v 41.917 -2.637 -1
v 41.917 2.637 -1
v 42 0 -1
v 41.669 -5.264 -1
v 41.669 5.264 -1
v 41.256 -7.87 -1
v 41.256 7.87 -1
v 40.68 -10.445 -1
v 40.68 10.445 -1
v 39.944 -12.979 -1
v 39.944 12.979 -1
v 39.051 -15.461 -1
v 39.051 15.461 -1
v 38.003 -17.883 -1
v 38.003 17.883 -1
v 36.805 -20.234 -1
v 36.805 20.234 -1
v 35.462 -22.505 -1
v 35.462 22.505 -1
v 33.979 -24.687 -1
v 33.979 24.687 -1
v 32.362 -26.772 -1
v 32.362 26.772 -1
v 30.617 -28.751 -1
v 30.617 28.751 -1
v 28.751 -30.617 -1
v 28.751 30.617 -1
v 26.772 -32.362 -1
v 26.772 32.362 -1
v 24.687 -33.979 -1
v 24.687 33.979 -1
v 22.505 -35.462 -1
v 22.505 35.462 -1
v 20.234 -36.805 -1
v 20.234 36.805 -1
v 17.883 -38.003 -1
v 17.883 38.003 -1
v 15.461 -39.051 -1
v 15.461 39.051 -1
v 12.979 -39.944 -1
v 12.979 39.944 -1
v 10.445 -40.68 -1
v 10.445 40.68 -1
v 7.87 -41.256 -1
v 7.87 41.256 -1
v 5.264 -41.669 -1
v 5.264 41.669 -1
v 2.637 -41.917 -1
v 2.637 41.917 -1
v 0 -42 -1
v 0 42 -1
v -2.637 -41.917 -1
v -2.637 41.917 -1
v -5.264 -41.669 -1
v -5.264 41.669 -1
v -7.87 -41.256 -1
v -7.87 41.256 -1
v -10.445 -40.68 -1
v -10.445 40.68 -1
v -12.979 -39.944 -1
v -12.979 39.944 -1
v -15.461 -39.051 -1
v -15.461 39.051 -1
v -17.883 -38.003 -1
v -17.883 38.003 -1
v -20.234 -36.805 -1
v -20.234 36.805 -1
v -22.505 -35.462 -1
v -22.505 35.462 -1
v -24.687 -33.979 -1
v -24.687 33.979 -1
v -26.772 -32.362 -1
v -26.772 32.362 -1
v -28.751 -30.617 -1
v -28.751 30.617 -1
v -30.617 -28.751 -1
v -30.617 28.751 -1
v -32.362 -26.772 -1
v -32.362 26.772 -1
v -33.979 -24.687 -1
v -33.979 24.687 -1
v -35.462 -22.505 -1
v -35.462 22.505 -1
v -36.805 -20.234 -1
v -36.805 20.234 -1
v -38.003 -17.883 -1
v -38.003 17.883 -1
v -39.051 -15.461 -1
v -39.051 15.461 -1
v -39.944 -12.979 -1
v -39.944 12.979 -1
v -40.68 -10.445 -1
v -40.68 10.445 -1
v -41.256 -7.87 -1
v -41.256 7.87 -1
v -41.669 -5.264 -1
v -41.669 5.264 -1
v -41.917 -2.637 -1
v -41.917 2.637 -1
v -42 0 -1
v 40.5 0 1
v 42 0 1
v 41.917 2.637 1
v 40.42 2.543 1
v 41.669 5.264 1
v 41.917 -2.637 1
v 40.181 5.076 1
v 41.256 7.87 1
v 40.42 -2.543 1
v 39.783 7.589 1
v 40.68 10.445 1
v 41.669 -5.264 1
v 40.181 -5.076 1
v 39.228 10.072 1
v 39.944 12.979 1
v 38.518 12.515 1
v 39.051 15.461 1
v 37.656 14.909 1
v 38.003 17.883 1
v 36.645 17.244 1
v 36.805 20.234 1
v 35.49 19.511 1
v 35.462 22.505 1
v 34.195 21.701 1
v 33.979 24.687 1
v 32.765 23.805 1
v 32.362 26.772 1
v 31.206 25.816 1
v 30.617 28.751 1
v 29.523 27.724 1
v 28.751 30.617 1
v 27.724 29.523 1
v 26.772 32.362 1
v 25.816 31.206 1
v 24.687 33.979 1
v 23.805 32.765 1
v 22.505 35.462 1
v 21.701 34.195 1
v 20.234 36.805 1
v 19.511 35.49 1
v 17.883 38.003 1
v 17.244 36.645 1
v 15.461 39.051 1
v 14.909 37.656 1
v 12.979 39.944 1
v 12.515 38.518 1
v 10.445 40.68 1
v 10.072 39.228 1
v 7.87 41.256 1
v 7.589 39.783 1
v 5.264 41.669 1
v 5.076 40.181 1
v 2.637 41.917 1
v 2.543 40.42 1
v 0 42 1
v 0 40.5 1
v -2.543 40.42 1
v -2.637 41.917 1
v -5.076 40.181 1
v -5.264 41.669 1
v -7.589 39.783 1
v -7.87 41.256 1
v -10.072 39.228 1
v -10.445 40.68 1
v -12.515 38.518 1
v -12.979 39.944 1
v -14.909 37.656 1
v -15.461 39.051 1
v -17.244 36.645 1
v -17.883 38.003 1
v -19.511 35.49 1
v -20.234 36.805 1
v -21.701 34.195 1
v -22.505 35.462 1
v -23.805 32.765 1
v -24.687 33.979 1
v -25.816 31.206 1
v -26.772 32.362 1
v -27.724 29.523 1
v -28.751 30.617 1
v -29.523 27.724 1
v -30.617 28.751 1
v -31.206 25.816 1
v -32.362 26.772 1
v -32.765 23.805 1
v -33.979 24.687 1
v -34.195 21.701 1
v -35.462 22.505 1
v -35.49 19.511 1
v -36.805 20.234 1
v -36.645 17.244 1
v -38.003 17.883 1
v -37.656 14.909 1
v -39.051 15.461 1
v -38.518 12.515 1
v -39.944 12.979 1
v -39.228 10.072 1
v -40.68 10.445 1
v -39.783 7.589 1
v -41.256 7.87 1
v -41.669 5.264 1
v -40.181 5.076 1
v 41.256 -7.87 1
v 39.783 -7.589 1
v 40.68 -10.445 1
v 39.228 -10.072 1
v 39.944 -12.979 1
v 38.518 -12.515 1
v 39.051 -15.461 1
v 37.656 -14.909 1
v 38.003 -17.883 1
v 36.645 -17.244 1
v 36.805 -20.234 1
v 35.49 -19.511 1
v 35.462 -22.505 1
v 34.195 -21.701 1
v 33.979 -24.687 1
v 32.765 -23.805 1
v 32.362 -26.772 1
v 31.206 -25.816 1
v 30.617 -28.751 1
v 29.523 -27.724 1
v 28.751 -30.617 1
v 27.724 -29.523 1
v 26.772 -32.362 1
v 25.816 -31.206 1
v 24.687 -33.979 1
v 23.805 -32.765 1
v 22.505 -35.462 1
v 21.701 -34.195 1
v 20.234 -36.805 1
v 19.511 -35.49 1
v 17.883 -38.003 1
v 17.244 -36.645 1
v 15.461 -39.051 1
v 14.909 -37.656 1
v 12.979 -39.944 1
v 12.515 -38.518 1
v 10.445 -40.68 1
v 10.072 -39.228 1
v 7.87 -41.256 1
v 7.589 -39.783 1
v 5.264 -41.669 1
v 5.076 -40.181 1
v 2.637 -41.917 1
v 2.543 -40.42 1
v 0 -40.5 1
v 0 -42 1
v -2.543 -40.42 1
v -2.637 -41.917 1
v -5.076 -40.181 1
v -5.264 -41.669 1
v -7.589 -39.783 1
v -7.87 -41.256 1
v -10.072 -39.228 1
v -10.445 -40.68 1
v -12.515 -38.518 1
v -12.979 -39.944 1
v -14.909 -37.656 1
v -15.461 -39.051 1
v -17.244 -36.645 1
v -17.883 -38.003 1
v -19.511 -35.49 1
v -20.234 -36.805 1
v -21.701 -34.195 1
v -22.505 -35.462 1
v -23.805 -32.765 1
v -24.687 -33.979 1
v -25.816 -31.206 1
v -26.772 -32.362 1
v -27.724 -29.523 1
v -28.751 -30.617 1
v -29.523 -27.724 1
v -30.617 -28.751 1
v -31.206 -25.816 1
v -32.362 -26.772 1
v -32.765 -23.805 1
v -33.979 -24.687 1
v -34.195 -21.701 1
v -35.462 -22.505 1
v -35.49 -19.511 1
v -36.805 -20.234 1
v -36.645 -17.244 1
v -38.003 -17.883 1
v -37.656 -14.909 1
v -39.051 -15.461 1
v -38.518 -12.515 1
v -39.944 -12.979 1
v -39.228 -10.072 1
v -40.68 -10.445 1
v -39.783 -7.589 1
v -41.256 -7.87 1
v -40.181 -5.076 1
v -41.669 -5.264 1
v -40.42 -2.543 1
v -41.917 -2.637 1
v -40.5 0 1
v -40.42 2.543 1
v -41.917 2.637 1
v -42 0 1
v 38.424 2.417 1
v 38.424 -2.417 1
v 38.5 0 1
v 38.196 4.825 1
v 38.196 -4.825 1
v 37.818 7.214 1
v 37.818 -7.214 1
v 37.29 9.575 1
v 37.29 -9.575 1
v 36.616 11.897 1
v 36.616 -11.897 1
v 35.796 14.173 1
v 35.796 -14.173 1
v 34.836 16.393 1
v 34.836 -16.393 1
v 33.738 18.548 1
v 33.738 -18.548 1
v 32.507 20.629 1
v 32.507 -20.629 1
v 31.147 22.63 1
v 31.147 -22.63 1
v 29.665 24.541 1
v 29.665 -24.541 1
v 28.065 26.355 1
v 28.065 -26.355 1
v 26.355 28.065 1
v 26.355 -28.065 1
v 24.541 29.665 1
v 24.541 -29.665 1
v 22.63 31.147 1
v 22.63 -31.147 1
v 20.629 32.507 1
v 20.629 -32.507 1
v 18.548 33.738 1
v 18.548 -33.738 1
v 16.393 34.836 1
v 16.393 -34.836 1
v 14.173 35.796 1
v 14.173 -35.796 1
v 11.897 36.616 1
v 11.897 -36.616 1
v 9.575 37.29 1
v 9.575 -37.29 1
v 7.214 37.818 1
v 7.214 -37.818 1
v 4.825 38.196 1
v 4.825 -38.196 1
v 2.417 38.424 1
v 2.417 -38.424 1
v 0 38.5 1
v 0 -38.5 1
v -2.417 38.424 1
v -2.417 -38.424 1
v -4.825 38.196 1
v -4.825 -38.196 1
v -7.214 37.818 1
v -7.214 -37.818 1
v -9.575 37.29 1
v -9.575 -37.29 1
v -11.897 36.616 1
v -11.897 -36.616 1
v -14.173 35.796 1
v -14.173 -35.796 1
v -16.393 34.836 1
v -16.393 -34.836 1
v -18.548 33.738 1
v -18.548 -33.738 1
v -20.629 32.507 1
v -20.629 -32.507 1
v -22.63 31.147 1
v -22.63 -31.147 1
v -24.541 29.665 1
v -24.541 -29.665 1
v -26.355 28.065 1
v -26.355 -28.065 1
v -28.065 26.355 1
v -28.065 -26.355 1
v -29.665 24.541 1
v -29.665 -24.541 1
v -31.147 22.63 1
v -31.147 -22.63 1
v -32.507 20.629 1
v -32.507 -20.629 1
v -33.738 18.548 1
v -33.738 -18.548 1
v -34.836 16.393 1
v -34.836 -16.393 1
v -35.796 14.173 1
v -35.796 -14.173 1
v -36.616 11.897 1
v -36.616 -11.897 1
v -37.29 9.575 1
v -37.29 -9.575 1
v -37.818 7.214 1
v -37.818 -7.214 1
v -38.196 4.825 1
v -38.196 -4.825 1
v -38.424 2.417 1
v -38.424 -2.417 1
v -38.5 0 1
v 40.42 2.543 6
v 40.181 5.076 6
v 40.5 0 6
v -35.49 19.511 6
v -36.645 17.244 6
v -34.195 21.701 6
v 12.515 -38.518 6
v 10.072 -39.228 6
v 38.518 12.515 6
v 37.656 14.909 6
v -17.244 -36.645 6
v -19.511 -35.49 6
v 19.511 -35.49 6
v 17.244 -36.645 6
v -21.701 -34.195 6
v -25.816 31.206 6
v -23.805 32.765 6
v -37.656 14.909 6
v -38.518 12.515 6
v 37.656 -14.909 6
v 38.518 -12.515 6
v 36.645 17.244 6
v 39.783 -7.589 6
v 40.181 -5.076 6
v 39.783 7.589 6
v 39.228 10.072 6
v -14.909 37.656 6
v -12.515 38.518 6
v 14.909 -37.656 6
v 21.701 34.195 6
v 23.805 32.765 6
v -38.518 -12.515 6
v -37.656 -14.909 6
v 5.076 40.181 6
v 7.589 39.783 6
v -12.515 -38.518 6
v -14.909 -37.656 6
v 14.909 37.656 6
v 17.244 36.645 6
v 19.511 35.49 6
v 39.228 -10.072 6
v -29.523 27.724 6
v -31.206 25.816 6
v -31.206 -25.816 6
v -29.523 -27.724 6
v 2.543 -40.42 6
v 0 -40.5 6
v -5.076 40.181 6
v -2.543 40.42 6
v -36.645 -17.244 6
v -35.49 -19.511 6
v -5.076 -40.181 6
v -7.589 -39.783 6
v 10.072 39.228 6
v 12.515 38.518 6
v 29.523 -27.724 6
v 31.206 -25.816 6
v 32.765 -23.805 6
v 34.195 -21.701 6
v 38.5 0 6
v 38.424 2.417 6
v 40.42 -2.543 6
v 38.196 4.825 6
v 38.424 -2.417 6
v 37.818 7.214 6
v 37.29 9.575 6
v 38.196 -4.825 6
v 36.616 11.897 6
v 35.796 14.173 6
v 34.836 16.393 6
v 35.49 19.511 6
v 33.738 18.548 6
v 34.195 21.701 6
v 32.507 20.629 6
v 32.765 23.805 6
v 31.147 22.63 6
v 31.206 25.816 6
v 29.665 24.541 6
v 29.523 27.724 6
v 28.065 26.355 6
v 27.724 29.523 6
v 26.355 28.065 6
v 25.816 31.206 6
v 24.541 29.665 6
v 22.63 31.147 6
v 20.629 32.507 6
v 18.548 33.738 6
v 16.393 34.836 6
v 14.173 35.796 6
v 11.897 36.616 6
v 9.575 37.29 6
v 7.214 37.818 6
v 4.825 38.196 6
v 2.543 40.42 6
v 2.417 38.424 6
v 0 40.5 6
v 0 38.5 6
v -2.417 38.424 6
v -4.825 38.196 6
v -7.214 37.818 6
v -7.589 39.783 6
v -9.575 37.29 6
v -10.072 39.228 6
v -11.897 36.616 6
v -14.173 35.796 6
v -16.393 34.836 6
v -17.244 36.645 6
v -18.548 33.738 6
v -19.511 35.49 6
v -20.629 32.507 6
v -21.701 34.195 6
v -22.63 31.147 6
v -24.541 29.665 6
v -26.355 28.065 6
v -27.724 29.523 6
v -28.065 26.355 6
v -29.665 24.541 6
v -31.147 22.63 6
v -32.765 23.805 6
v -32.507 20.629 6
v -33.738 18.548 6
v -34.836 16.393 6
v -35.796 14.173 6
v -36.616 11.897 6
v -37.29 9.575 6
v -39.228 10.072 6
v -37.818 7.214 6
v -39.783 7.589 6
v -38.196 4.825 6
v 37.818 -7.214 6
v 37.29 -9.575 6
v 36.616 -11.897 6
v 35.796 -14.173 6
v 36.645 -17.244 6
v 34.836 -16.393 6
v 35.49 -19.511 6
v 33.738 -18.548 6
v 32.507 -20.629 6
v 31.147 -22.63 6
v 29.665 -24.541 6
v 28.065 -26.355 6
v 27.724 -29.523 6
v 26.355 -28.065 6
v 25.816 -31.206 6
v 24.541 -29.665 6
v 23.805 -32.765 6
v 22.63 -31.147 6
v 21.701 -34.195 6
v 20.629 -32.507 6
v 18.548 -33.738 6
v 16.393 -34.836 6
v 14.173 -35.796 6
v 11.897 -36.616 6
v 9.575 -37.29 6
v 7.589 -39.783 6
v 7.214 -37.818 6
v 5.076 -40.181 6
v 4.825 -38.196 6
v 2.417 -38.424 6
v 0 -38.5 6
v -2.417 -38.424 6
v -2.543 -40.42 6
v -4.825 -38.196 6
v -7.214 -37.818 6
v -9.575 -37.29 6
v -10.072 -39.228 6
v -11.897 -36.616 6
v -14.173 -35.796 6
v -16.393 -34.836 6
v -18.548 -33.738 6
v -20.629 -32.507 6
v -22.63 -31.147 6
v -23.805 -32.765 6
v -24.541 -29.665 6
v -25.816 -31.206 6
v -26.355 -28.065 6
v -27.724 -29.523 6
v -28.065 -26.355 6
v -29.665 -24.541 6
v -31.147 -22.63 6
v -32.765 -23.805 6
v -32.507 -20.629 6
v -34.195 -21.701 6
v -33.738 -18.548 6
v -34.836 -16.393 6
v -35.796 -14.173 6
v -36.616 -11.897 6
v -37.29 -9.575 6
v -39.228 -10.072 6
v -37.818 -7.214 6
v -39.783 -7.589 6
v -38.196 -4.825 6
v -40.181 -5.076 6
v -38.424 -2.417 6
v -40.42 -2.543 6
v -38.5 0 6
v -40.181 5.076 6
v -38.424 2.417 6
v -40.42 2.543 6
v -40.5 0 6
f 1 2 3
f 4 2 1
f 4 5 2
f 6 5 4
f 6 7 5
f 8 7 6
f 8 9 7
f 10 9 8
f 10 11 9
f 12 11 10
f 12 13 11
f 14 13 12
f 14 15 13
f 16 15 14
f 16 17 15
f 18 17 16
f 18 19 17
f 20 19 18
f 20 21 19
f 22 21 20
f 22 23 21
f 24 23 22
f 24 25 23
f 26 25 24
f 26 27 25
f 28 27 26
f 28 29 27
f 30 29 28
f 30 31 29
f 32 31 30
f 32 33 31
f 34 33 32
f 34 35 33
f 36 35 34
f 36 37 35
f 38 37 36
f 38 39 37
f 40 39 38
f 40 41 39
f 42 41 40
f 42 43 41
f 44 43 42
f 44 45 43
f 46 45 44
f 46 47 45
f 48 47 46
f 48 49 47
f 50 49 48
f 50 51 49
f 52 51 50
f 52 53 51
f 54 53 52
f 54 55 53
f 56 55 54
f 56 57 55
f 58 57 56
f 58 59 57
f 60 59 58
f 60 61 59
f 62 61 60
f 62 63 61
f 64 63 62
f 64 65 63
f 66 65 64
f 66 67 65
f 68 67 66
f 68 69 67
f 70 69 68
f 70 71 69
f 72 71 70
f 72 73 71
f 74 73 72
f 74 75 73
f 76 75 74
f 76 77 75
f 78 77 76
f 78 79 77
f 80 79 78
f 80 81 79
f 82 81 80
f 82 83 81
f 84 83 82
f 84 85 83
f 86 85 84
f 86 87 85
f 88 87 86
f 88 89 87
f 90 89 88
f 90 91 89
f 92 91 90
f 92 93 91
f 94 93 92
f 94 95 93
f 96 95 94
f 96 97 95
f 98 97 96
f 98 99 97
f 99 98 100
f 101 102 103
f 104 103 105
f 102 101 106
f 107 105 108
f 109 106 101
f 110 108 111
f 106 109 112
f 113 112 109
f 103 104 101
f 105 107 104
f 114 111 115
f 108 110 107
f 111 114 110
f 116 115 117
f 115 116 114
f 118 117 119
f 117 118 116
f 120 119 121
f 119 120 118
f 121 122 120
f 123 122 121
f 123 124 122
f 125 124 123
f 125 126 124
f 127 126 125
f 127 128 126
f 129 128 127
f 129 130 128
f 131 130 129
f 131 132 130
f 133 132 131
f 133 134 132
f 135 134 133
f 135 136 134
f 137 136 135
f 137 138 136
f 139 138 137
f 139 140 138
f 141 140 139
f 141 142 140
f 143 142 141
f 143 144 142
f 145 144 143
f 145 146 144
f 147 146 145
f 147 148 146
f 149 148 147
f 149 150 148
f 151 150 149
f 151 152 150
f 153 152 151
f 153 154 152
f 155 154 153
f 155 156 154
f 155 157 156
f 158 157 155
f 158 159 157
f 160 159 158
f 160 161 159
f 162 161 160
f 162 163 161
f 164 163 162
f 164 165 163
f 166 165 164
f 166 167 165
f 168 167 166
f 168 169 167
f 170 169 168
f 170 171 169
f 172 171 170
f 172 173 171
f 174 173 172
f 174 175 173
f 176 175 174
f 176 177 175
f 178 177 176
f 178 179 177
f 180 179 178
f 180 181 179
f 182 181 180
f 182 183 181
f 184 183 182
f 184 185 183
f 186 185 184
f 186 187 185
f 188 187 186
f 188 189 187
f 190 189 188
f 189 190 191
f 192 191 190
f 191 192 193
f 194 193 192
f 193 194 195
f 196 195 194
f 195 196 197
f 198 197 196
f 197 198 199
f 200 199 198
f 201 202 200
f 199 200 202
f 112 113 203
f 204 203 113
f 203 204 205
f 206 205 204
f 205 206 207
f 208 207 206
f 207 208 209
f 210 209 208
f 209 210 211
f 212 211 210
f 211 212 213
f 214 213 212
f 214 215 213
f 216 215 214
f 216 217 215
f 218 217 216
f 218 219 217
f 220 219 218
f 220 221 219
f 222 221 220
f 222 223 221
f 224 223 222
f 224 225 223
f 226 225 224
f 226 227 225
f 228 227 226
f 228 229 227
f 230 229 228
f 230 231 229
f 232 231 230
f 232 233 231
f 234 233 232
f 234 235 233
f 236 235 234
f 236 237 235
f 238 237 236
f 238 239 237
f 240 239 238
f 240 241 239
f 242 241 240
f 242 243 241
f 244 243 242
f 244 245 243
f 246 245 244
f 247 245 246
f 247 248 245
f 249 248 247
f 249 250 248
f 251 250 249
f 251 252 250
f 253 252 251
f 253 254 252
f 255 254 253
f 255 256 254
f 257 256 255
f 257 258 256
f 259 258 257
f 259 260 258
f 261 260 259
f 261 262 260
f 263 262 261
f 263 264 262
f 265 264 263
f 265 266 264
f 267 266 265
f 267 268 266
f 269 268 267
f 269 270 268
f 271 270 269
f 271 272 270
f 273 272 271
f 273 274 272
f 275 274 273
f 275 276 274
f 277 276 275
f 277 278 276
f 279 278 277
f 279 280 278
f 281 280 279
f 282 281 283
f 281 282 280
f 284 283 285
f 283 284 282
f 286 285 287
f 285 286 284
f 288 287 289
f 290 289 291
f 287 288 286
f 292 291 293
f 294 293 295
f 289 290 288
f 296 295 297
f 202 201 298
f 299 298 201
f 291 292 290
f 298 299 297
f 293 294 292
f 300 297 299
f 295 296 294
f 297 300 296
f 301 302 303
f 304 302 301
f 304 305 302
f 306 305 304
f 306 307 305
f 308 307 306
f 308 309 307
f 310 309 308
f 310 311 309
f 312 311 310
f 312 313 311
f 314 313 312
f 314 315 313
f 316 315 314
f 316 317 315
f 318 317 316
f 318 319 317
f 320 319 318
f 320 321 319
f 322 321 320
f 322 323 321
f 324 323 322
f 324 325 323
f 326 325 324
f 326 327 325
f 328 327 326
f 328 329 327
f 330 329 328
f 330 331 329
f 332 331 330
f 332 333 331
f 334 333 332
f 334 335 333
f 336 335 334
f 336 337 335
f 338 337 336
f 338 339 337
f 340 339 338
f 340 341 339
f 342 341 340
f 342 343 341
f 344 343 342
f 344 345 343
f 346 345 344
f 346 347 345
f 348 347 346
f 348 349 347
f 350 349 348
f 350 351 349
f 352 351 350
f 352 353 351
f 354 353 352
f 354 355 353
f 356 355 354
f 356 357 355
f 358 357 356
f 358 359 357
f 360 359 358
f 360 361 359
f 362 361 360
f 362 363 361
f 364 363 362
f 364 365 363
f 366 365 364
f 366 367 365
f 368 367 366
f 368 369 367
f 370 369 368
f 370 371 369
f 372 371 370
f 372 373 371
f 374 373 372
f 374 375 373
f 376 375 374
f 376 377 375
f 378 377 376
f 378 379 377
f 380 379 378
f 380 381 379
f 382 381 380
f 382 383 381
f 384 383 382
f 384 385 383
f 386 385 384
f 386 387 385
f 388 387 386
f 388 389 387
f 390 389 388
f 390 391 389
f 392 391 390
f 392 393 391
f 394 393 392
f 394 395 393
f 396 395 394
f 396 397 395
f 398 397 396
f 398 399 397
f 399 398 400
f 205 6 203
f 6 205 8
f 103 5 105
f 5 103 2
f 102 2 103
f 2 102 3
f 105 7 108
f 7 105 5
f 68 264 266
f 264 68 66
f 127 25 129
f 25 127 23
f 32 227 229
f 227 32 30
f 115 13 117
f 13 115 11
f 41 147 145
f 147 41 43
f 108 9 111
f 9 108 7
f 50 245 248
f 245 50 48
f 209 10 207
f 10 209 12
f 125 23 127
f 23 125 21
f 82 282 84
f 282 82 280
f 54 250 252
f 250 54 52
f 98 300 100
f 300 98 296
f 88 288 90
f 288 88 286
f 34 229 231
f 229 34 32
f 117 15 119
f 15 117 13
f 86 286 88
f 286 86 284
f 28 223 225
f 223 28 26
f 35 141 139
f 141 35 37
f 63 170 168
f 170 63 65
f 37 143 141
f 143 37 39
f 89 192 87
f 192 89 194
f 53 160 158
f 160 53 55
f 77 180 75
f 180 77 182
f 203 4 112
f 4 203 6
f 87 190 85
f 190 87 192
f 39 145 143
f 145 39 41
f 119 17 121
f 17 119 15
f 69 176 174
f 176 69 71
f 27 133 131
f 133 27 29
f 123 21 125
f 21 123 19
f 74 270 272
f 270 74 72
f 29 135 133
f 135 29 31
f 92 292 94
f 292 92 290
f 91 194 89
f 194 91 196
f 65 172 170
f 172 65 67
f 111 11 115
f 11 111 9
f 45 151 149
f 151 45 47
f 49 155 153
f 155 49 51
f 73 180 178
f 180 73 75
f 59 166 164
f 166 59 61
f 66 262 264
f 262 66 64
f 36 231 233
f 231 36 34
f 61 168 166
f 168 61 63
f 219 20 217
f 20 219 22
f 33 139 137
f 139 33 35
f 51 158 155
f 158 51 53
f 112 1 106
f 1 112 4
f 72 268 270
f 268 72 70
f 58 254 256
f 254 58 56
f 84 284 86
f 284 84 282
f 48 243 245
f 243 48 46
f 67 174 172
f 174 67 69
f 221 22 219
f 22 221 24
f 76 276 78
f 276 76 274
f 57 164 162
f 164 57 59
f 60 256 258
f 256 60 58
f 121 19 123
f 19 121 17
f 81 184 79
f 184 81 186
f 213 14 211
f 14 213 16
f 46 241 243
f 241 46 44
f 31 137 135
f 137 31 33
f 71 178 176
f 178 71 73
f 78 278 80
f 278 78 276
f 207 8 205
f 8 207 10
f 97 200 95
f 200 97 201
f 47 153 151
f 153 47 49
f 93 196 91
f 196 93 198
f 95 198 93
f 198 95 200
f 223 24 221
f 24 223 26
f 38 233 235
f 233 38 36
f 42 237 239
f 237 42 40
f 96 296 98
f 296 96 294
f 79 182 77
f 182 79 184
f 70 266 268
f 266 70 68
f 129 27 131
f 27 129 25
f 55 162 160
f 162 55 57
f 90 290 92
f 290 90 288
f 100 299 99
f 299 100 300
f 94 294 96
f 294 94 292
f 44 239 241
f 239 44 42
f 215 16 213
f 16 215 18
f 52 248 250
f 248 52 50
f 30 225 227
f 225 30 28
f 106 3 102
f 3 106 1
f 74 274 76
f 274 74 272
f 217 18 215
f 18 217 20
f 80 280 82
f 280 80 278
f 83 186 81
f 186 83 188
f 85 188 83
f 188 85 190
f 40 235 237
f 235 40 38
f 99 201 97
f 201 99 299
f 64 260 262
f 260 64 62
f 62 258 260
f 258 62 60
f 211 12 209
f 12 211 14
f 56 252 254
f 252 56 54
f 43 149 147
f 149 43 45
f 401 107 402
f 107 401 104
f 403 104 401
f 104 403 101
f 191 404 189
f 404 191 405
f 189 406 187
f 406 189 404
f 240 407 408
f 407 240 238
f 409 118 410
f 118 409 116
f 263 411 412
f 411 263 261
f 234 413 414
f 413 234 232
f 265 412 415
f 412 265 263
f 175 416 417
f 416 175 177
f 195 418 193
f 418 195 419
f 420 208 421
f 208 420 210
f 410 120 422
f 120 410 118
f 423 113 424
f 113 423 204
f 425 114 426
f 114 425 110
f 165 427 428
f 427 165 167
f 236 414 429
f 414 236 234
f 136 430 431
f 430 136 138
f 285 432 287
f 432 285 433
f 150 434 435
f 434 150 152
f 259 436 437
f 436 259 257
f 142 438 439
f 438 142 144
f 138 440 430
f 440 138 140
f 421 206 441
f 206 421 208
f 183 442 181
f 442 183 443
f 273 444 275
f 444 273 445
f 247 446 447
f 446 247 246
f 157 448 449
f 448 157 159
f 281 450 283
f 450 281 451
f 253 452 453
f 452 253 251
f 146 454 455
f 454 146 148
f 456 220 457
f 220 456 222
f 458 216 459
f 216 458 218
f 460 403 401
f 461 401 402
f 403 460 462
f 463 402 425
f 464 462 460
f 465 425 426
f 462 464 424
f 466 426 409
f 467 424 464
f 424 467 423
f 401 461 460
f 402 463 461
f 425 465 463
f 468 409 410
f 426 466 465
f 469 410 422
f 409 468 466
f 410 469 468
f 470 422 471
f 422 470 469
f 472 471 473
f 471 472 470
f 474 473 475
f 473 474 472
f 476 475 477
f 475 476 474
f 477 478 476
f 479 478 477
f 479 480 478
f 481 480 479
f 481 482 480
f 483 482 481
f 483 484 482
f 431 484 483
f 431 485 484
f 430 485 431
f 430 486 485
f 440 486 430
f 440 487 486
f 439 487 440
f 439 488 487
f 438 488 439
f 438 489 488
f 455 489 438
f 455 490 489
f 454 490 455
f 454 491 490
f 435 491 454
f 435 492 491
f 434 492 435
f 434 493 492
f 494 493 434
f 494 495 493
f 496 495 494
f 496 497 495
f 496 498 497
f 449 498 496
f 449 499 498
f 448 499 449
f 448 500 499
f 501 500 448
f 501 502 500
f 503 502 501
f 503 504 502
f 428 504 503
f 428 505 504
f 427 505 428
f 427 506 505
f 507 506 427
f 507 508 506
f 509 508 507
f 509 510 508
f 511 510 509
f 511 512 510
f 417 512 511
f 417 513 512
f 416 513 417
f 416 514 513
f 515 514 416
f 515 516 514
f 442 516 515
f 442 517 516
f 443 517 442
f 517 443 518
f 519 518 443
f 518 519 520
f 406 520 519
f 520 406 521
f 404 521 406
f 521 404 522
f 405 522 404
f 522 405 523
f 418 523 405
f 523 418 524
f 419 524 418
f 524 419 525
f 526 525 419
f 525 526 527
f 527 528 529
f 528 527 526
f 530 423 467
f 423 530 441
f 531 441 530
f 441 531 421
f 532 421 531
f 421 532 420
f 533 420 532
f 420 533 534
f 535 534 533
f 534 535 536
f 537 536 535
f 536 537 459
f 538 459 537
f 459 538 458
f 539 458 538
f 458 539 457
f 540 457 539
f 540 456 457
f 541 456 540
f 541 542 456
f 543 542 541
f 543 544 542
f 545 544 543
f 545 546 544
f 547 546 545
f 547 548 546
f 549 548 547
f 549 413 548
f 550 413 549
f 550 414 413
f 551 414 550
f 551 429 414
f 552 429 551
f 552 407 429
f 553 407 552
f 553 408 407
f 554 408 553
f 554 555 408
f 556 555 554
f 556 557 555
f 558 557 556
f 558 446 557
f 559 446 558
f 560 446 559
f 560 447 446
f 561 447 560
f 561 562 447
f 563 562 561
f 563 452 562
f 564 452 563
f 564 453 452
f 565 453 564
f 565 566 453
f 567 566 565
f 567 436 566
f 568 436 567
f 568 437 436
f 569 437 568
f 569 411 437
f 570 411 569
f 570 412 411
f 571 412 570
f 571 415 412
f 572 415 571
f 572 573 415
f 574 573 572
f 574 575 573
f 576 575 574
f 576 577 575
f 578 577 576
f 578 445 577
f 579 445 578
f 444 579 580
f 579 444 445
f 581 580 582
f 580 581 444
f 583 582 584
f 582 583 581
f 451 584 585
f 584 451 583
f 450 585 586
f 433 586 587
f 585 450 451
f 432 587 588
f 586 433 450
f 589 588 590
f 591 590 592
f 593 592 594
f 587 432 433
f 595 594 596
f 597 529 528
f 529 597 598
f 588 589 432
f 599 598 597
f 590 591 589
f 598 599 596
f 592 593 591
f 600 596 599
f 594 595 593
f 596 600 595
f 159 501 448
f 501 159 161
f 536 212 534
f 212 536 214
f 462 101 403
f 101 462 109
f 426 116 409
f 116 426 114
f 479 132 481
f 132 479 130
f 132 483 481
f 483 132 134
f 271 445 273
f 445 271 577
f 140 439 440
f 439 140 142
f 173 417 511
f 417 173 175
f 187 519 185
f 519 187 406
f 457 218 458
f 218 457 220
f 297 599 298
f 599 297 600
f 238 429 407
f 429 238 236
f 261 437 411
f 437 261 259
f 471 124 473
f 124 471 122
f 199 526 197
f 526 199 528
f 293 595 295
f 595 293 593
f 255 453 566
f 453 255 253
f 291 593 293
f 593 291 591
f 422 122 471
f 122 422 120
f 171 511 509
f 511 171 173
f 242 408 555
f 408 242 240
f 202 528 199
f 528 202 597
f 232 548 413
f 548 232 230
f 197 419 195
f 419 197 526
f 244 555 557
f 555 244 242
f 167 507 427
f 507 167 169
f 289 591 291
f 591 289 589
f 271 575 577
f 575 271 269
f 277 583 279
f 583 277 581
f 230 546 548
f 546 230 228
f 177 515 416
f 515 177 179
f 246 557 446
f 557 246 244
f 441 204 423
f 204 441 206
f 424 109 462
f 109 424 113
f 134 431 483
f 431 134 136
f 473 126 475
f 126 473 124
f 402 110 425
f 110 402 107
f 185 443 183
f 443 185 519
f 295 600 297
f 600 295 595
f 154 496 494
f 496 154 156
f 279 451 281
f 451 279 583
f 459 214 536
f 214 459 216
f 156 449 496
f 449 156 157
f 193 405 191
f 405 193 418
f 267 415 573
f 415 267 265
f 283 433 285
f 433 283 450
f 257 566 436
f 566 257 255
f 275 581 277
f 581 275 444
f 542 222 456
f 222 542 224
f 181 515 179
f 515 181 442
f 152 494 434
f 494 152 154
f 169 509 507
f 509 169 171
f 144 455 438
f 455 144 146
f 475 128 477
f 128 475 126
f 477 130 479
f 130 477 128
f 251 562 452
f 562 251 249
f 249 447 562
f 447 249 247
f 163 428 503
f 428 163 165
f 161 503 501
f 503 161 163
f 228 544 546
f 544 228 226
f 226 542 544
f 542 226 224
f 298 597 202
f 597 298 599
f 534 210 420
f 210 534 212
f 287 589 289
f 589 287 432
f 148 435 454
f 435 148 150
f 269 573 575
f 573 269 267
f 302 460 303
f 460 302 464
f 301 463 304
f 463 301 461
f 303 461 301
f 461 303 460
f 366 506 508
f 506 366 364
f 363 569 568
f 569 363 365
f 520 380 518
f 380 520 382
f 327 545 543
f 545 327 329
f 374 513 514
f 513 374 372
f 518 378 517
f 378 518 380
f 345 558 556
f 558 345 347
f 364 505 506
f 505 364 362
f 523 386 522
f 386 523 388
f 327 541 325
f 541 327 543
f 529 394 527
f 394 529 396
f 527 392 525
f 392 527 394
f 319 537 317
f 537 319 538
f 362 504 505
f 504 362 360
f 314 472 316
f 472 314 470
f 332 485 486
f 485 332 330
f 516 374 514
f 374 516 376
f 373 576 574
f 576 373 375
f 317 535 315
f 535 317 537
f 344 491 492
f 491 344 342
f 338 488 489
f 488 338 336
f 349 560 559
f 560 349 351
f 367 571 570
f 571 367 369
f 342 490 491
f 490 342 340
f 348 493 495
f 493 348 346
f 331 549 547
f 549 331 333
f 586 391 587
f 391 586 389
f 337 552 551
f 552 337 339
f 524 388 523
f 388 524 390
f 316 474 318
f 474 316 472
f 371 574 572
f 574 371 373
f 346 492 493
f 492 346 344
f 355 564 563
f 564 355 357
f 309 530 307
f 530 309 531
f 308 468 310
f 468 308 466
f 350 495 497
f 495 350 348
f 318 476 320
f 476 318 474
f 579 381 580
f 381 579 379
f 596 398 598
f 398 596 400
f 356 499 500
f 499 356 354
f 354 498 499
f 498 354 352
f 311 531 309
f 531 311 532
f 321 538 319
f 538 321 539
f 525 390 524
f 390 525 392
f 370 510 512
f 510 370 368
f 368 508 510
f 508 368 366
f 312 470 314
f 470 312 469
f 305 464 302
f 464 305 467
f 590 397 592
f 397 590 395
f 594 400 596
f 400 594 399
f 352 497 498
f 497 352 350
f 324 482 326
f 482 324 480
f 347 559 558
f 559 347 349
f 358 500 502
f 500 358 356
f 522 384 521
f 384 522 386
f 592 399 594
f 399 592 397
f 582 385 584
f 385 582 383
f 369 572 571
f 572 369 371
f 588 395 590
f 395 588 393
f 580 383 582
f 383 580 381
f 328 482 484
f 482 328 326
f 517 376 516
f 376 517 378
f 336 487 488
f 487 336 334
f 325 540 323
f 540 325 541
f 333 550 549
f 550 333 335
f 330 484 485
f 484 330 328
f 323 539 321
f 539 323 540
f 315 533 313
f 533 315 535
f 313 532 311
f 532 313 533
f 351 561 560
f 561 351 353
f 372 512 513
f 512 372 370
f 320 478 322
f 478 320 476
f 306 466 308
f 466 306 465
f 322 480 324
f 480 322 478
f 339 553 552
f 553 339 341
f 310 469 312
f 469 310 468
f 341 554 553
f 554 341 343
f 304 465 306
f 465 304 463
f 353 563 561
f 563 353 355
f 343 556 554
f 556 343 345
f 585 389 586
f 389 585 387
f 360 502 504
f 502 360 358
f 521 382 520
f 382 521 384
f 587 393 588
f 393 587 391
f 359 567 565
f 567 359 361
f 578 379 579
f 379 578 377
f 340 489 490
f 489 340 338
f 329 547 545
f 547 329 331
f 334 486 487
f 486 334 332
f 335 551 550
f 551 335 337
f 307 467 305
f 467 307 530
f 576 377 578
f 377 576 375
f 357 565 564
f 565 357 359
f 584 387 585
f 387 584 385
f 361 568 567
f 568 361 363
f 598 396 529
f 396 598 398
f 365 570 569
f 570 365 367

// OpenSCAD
DIAMETER = 84;
RING_THICKNESS = 5;
HEIGHT = 2;
LIP_HEIGHT = 5;
HOLE_DIA = 5;
BAR_THICKNESS = 2;

$fn = 100;

module hexagon(d, h) {
  r = d/2;
  linear_extrude(height = h, center = true)
    union() {
      for(i = [0:5]) {
        rotate([0, 0, i * 60])
          polygon(points = [[0, 0], [r, r*tan(-30)], [r, r*tan(30)]]);
      }
    }
}

module honeycomb(dia, hole_dia, bar_thickness, height) {
  DELTA_X = (hole_dia + bar_thickness/2);
  X_HOLES = floor((dia / DELTA_X));
  DELTA_Y = sqrt(pow(hole_dia + bar_thickness/2, 2) - pow(hole_dia/2, 2));
  Y_HOLES = floor(dia / DELTA_Y);

  difference() {
    cylinder(d = dia, h = height, center = true);

    translate([-(X_HOLES*DELTA_X)/2, -(Y_HOLES*DELTA_Y)/2, 0])
      for(j = [0:Y_HOLES]) {
        for(i = [0:X_HOLES + (j % 2)]) {
          translate([-(j % 2) * DELTA_X/2, 0, 0])
            translate([i * DELTA_X, j * DELTA_Y, 0])
              hexagon(hole_dia, height + 2);
        }
      }
  }
}

module ring(dia, bar_thickness, height, center) {
  difference() {
    cylinder(d = dia, h = height, center = center);
    translate([0, 0, -1])
      cylinder(d = dia - 2 * bar_thickness, h = height + 3, center = center);
  }
}

union() {
  honeycomb(DIAMETER-RING_THICKNESS, HOLE_DIA, BAR_THICKNESS, HEIGHT);
  ring(DIAMETER, RING_THICKNESS, HEIGHT, true);
  translate([0, 0, HEIGHT/2])
    ring(DIAMETER - RING_THICKNESS + BAR_THICKNESS, BAR_THICKNESS, LIP_HEIGHT, false);
}
